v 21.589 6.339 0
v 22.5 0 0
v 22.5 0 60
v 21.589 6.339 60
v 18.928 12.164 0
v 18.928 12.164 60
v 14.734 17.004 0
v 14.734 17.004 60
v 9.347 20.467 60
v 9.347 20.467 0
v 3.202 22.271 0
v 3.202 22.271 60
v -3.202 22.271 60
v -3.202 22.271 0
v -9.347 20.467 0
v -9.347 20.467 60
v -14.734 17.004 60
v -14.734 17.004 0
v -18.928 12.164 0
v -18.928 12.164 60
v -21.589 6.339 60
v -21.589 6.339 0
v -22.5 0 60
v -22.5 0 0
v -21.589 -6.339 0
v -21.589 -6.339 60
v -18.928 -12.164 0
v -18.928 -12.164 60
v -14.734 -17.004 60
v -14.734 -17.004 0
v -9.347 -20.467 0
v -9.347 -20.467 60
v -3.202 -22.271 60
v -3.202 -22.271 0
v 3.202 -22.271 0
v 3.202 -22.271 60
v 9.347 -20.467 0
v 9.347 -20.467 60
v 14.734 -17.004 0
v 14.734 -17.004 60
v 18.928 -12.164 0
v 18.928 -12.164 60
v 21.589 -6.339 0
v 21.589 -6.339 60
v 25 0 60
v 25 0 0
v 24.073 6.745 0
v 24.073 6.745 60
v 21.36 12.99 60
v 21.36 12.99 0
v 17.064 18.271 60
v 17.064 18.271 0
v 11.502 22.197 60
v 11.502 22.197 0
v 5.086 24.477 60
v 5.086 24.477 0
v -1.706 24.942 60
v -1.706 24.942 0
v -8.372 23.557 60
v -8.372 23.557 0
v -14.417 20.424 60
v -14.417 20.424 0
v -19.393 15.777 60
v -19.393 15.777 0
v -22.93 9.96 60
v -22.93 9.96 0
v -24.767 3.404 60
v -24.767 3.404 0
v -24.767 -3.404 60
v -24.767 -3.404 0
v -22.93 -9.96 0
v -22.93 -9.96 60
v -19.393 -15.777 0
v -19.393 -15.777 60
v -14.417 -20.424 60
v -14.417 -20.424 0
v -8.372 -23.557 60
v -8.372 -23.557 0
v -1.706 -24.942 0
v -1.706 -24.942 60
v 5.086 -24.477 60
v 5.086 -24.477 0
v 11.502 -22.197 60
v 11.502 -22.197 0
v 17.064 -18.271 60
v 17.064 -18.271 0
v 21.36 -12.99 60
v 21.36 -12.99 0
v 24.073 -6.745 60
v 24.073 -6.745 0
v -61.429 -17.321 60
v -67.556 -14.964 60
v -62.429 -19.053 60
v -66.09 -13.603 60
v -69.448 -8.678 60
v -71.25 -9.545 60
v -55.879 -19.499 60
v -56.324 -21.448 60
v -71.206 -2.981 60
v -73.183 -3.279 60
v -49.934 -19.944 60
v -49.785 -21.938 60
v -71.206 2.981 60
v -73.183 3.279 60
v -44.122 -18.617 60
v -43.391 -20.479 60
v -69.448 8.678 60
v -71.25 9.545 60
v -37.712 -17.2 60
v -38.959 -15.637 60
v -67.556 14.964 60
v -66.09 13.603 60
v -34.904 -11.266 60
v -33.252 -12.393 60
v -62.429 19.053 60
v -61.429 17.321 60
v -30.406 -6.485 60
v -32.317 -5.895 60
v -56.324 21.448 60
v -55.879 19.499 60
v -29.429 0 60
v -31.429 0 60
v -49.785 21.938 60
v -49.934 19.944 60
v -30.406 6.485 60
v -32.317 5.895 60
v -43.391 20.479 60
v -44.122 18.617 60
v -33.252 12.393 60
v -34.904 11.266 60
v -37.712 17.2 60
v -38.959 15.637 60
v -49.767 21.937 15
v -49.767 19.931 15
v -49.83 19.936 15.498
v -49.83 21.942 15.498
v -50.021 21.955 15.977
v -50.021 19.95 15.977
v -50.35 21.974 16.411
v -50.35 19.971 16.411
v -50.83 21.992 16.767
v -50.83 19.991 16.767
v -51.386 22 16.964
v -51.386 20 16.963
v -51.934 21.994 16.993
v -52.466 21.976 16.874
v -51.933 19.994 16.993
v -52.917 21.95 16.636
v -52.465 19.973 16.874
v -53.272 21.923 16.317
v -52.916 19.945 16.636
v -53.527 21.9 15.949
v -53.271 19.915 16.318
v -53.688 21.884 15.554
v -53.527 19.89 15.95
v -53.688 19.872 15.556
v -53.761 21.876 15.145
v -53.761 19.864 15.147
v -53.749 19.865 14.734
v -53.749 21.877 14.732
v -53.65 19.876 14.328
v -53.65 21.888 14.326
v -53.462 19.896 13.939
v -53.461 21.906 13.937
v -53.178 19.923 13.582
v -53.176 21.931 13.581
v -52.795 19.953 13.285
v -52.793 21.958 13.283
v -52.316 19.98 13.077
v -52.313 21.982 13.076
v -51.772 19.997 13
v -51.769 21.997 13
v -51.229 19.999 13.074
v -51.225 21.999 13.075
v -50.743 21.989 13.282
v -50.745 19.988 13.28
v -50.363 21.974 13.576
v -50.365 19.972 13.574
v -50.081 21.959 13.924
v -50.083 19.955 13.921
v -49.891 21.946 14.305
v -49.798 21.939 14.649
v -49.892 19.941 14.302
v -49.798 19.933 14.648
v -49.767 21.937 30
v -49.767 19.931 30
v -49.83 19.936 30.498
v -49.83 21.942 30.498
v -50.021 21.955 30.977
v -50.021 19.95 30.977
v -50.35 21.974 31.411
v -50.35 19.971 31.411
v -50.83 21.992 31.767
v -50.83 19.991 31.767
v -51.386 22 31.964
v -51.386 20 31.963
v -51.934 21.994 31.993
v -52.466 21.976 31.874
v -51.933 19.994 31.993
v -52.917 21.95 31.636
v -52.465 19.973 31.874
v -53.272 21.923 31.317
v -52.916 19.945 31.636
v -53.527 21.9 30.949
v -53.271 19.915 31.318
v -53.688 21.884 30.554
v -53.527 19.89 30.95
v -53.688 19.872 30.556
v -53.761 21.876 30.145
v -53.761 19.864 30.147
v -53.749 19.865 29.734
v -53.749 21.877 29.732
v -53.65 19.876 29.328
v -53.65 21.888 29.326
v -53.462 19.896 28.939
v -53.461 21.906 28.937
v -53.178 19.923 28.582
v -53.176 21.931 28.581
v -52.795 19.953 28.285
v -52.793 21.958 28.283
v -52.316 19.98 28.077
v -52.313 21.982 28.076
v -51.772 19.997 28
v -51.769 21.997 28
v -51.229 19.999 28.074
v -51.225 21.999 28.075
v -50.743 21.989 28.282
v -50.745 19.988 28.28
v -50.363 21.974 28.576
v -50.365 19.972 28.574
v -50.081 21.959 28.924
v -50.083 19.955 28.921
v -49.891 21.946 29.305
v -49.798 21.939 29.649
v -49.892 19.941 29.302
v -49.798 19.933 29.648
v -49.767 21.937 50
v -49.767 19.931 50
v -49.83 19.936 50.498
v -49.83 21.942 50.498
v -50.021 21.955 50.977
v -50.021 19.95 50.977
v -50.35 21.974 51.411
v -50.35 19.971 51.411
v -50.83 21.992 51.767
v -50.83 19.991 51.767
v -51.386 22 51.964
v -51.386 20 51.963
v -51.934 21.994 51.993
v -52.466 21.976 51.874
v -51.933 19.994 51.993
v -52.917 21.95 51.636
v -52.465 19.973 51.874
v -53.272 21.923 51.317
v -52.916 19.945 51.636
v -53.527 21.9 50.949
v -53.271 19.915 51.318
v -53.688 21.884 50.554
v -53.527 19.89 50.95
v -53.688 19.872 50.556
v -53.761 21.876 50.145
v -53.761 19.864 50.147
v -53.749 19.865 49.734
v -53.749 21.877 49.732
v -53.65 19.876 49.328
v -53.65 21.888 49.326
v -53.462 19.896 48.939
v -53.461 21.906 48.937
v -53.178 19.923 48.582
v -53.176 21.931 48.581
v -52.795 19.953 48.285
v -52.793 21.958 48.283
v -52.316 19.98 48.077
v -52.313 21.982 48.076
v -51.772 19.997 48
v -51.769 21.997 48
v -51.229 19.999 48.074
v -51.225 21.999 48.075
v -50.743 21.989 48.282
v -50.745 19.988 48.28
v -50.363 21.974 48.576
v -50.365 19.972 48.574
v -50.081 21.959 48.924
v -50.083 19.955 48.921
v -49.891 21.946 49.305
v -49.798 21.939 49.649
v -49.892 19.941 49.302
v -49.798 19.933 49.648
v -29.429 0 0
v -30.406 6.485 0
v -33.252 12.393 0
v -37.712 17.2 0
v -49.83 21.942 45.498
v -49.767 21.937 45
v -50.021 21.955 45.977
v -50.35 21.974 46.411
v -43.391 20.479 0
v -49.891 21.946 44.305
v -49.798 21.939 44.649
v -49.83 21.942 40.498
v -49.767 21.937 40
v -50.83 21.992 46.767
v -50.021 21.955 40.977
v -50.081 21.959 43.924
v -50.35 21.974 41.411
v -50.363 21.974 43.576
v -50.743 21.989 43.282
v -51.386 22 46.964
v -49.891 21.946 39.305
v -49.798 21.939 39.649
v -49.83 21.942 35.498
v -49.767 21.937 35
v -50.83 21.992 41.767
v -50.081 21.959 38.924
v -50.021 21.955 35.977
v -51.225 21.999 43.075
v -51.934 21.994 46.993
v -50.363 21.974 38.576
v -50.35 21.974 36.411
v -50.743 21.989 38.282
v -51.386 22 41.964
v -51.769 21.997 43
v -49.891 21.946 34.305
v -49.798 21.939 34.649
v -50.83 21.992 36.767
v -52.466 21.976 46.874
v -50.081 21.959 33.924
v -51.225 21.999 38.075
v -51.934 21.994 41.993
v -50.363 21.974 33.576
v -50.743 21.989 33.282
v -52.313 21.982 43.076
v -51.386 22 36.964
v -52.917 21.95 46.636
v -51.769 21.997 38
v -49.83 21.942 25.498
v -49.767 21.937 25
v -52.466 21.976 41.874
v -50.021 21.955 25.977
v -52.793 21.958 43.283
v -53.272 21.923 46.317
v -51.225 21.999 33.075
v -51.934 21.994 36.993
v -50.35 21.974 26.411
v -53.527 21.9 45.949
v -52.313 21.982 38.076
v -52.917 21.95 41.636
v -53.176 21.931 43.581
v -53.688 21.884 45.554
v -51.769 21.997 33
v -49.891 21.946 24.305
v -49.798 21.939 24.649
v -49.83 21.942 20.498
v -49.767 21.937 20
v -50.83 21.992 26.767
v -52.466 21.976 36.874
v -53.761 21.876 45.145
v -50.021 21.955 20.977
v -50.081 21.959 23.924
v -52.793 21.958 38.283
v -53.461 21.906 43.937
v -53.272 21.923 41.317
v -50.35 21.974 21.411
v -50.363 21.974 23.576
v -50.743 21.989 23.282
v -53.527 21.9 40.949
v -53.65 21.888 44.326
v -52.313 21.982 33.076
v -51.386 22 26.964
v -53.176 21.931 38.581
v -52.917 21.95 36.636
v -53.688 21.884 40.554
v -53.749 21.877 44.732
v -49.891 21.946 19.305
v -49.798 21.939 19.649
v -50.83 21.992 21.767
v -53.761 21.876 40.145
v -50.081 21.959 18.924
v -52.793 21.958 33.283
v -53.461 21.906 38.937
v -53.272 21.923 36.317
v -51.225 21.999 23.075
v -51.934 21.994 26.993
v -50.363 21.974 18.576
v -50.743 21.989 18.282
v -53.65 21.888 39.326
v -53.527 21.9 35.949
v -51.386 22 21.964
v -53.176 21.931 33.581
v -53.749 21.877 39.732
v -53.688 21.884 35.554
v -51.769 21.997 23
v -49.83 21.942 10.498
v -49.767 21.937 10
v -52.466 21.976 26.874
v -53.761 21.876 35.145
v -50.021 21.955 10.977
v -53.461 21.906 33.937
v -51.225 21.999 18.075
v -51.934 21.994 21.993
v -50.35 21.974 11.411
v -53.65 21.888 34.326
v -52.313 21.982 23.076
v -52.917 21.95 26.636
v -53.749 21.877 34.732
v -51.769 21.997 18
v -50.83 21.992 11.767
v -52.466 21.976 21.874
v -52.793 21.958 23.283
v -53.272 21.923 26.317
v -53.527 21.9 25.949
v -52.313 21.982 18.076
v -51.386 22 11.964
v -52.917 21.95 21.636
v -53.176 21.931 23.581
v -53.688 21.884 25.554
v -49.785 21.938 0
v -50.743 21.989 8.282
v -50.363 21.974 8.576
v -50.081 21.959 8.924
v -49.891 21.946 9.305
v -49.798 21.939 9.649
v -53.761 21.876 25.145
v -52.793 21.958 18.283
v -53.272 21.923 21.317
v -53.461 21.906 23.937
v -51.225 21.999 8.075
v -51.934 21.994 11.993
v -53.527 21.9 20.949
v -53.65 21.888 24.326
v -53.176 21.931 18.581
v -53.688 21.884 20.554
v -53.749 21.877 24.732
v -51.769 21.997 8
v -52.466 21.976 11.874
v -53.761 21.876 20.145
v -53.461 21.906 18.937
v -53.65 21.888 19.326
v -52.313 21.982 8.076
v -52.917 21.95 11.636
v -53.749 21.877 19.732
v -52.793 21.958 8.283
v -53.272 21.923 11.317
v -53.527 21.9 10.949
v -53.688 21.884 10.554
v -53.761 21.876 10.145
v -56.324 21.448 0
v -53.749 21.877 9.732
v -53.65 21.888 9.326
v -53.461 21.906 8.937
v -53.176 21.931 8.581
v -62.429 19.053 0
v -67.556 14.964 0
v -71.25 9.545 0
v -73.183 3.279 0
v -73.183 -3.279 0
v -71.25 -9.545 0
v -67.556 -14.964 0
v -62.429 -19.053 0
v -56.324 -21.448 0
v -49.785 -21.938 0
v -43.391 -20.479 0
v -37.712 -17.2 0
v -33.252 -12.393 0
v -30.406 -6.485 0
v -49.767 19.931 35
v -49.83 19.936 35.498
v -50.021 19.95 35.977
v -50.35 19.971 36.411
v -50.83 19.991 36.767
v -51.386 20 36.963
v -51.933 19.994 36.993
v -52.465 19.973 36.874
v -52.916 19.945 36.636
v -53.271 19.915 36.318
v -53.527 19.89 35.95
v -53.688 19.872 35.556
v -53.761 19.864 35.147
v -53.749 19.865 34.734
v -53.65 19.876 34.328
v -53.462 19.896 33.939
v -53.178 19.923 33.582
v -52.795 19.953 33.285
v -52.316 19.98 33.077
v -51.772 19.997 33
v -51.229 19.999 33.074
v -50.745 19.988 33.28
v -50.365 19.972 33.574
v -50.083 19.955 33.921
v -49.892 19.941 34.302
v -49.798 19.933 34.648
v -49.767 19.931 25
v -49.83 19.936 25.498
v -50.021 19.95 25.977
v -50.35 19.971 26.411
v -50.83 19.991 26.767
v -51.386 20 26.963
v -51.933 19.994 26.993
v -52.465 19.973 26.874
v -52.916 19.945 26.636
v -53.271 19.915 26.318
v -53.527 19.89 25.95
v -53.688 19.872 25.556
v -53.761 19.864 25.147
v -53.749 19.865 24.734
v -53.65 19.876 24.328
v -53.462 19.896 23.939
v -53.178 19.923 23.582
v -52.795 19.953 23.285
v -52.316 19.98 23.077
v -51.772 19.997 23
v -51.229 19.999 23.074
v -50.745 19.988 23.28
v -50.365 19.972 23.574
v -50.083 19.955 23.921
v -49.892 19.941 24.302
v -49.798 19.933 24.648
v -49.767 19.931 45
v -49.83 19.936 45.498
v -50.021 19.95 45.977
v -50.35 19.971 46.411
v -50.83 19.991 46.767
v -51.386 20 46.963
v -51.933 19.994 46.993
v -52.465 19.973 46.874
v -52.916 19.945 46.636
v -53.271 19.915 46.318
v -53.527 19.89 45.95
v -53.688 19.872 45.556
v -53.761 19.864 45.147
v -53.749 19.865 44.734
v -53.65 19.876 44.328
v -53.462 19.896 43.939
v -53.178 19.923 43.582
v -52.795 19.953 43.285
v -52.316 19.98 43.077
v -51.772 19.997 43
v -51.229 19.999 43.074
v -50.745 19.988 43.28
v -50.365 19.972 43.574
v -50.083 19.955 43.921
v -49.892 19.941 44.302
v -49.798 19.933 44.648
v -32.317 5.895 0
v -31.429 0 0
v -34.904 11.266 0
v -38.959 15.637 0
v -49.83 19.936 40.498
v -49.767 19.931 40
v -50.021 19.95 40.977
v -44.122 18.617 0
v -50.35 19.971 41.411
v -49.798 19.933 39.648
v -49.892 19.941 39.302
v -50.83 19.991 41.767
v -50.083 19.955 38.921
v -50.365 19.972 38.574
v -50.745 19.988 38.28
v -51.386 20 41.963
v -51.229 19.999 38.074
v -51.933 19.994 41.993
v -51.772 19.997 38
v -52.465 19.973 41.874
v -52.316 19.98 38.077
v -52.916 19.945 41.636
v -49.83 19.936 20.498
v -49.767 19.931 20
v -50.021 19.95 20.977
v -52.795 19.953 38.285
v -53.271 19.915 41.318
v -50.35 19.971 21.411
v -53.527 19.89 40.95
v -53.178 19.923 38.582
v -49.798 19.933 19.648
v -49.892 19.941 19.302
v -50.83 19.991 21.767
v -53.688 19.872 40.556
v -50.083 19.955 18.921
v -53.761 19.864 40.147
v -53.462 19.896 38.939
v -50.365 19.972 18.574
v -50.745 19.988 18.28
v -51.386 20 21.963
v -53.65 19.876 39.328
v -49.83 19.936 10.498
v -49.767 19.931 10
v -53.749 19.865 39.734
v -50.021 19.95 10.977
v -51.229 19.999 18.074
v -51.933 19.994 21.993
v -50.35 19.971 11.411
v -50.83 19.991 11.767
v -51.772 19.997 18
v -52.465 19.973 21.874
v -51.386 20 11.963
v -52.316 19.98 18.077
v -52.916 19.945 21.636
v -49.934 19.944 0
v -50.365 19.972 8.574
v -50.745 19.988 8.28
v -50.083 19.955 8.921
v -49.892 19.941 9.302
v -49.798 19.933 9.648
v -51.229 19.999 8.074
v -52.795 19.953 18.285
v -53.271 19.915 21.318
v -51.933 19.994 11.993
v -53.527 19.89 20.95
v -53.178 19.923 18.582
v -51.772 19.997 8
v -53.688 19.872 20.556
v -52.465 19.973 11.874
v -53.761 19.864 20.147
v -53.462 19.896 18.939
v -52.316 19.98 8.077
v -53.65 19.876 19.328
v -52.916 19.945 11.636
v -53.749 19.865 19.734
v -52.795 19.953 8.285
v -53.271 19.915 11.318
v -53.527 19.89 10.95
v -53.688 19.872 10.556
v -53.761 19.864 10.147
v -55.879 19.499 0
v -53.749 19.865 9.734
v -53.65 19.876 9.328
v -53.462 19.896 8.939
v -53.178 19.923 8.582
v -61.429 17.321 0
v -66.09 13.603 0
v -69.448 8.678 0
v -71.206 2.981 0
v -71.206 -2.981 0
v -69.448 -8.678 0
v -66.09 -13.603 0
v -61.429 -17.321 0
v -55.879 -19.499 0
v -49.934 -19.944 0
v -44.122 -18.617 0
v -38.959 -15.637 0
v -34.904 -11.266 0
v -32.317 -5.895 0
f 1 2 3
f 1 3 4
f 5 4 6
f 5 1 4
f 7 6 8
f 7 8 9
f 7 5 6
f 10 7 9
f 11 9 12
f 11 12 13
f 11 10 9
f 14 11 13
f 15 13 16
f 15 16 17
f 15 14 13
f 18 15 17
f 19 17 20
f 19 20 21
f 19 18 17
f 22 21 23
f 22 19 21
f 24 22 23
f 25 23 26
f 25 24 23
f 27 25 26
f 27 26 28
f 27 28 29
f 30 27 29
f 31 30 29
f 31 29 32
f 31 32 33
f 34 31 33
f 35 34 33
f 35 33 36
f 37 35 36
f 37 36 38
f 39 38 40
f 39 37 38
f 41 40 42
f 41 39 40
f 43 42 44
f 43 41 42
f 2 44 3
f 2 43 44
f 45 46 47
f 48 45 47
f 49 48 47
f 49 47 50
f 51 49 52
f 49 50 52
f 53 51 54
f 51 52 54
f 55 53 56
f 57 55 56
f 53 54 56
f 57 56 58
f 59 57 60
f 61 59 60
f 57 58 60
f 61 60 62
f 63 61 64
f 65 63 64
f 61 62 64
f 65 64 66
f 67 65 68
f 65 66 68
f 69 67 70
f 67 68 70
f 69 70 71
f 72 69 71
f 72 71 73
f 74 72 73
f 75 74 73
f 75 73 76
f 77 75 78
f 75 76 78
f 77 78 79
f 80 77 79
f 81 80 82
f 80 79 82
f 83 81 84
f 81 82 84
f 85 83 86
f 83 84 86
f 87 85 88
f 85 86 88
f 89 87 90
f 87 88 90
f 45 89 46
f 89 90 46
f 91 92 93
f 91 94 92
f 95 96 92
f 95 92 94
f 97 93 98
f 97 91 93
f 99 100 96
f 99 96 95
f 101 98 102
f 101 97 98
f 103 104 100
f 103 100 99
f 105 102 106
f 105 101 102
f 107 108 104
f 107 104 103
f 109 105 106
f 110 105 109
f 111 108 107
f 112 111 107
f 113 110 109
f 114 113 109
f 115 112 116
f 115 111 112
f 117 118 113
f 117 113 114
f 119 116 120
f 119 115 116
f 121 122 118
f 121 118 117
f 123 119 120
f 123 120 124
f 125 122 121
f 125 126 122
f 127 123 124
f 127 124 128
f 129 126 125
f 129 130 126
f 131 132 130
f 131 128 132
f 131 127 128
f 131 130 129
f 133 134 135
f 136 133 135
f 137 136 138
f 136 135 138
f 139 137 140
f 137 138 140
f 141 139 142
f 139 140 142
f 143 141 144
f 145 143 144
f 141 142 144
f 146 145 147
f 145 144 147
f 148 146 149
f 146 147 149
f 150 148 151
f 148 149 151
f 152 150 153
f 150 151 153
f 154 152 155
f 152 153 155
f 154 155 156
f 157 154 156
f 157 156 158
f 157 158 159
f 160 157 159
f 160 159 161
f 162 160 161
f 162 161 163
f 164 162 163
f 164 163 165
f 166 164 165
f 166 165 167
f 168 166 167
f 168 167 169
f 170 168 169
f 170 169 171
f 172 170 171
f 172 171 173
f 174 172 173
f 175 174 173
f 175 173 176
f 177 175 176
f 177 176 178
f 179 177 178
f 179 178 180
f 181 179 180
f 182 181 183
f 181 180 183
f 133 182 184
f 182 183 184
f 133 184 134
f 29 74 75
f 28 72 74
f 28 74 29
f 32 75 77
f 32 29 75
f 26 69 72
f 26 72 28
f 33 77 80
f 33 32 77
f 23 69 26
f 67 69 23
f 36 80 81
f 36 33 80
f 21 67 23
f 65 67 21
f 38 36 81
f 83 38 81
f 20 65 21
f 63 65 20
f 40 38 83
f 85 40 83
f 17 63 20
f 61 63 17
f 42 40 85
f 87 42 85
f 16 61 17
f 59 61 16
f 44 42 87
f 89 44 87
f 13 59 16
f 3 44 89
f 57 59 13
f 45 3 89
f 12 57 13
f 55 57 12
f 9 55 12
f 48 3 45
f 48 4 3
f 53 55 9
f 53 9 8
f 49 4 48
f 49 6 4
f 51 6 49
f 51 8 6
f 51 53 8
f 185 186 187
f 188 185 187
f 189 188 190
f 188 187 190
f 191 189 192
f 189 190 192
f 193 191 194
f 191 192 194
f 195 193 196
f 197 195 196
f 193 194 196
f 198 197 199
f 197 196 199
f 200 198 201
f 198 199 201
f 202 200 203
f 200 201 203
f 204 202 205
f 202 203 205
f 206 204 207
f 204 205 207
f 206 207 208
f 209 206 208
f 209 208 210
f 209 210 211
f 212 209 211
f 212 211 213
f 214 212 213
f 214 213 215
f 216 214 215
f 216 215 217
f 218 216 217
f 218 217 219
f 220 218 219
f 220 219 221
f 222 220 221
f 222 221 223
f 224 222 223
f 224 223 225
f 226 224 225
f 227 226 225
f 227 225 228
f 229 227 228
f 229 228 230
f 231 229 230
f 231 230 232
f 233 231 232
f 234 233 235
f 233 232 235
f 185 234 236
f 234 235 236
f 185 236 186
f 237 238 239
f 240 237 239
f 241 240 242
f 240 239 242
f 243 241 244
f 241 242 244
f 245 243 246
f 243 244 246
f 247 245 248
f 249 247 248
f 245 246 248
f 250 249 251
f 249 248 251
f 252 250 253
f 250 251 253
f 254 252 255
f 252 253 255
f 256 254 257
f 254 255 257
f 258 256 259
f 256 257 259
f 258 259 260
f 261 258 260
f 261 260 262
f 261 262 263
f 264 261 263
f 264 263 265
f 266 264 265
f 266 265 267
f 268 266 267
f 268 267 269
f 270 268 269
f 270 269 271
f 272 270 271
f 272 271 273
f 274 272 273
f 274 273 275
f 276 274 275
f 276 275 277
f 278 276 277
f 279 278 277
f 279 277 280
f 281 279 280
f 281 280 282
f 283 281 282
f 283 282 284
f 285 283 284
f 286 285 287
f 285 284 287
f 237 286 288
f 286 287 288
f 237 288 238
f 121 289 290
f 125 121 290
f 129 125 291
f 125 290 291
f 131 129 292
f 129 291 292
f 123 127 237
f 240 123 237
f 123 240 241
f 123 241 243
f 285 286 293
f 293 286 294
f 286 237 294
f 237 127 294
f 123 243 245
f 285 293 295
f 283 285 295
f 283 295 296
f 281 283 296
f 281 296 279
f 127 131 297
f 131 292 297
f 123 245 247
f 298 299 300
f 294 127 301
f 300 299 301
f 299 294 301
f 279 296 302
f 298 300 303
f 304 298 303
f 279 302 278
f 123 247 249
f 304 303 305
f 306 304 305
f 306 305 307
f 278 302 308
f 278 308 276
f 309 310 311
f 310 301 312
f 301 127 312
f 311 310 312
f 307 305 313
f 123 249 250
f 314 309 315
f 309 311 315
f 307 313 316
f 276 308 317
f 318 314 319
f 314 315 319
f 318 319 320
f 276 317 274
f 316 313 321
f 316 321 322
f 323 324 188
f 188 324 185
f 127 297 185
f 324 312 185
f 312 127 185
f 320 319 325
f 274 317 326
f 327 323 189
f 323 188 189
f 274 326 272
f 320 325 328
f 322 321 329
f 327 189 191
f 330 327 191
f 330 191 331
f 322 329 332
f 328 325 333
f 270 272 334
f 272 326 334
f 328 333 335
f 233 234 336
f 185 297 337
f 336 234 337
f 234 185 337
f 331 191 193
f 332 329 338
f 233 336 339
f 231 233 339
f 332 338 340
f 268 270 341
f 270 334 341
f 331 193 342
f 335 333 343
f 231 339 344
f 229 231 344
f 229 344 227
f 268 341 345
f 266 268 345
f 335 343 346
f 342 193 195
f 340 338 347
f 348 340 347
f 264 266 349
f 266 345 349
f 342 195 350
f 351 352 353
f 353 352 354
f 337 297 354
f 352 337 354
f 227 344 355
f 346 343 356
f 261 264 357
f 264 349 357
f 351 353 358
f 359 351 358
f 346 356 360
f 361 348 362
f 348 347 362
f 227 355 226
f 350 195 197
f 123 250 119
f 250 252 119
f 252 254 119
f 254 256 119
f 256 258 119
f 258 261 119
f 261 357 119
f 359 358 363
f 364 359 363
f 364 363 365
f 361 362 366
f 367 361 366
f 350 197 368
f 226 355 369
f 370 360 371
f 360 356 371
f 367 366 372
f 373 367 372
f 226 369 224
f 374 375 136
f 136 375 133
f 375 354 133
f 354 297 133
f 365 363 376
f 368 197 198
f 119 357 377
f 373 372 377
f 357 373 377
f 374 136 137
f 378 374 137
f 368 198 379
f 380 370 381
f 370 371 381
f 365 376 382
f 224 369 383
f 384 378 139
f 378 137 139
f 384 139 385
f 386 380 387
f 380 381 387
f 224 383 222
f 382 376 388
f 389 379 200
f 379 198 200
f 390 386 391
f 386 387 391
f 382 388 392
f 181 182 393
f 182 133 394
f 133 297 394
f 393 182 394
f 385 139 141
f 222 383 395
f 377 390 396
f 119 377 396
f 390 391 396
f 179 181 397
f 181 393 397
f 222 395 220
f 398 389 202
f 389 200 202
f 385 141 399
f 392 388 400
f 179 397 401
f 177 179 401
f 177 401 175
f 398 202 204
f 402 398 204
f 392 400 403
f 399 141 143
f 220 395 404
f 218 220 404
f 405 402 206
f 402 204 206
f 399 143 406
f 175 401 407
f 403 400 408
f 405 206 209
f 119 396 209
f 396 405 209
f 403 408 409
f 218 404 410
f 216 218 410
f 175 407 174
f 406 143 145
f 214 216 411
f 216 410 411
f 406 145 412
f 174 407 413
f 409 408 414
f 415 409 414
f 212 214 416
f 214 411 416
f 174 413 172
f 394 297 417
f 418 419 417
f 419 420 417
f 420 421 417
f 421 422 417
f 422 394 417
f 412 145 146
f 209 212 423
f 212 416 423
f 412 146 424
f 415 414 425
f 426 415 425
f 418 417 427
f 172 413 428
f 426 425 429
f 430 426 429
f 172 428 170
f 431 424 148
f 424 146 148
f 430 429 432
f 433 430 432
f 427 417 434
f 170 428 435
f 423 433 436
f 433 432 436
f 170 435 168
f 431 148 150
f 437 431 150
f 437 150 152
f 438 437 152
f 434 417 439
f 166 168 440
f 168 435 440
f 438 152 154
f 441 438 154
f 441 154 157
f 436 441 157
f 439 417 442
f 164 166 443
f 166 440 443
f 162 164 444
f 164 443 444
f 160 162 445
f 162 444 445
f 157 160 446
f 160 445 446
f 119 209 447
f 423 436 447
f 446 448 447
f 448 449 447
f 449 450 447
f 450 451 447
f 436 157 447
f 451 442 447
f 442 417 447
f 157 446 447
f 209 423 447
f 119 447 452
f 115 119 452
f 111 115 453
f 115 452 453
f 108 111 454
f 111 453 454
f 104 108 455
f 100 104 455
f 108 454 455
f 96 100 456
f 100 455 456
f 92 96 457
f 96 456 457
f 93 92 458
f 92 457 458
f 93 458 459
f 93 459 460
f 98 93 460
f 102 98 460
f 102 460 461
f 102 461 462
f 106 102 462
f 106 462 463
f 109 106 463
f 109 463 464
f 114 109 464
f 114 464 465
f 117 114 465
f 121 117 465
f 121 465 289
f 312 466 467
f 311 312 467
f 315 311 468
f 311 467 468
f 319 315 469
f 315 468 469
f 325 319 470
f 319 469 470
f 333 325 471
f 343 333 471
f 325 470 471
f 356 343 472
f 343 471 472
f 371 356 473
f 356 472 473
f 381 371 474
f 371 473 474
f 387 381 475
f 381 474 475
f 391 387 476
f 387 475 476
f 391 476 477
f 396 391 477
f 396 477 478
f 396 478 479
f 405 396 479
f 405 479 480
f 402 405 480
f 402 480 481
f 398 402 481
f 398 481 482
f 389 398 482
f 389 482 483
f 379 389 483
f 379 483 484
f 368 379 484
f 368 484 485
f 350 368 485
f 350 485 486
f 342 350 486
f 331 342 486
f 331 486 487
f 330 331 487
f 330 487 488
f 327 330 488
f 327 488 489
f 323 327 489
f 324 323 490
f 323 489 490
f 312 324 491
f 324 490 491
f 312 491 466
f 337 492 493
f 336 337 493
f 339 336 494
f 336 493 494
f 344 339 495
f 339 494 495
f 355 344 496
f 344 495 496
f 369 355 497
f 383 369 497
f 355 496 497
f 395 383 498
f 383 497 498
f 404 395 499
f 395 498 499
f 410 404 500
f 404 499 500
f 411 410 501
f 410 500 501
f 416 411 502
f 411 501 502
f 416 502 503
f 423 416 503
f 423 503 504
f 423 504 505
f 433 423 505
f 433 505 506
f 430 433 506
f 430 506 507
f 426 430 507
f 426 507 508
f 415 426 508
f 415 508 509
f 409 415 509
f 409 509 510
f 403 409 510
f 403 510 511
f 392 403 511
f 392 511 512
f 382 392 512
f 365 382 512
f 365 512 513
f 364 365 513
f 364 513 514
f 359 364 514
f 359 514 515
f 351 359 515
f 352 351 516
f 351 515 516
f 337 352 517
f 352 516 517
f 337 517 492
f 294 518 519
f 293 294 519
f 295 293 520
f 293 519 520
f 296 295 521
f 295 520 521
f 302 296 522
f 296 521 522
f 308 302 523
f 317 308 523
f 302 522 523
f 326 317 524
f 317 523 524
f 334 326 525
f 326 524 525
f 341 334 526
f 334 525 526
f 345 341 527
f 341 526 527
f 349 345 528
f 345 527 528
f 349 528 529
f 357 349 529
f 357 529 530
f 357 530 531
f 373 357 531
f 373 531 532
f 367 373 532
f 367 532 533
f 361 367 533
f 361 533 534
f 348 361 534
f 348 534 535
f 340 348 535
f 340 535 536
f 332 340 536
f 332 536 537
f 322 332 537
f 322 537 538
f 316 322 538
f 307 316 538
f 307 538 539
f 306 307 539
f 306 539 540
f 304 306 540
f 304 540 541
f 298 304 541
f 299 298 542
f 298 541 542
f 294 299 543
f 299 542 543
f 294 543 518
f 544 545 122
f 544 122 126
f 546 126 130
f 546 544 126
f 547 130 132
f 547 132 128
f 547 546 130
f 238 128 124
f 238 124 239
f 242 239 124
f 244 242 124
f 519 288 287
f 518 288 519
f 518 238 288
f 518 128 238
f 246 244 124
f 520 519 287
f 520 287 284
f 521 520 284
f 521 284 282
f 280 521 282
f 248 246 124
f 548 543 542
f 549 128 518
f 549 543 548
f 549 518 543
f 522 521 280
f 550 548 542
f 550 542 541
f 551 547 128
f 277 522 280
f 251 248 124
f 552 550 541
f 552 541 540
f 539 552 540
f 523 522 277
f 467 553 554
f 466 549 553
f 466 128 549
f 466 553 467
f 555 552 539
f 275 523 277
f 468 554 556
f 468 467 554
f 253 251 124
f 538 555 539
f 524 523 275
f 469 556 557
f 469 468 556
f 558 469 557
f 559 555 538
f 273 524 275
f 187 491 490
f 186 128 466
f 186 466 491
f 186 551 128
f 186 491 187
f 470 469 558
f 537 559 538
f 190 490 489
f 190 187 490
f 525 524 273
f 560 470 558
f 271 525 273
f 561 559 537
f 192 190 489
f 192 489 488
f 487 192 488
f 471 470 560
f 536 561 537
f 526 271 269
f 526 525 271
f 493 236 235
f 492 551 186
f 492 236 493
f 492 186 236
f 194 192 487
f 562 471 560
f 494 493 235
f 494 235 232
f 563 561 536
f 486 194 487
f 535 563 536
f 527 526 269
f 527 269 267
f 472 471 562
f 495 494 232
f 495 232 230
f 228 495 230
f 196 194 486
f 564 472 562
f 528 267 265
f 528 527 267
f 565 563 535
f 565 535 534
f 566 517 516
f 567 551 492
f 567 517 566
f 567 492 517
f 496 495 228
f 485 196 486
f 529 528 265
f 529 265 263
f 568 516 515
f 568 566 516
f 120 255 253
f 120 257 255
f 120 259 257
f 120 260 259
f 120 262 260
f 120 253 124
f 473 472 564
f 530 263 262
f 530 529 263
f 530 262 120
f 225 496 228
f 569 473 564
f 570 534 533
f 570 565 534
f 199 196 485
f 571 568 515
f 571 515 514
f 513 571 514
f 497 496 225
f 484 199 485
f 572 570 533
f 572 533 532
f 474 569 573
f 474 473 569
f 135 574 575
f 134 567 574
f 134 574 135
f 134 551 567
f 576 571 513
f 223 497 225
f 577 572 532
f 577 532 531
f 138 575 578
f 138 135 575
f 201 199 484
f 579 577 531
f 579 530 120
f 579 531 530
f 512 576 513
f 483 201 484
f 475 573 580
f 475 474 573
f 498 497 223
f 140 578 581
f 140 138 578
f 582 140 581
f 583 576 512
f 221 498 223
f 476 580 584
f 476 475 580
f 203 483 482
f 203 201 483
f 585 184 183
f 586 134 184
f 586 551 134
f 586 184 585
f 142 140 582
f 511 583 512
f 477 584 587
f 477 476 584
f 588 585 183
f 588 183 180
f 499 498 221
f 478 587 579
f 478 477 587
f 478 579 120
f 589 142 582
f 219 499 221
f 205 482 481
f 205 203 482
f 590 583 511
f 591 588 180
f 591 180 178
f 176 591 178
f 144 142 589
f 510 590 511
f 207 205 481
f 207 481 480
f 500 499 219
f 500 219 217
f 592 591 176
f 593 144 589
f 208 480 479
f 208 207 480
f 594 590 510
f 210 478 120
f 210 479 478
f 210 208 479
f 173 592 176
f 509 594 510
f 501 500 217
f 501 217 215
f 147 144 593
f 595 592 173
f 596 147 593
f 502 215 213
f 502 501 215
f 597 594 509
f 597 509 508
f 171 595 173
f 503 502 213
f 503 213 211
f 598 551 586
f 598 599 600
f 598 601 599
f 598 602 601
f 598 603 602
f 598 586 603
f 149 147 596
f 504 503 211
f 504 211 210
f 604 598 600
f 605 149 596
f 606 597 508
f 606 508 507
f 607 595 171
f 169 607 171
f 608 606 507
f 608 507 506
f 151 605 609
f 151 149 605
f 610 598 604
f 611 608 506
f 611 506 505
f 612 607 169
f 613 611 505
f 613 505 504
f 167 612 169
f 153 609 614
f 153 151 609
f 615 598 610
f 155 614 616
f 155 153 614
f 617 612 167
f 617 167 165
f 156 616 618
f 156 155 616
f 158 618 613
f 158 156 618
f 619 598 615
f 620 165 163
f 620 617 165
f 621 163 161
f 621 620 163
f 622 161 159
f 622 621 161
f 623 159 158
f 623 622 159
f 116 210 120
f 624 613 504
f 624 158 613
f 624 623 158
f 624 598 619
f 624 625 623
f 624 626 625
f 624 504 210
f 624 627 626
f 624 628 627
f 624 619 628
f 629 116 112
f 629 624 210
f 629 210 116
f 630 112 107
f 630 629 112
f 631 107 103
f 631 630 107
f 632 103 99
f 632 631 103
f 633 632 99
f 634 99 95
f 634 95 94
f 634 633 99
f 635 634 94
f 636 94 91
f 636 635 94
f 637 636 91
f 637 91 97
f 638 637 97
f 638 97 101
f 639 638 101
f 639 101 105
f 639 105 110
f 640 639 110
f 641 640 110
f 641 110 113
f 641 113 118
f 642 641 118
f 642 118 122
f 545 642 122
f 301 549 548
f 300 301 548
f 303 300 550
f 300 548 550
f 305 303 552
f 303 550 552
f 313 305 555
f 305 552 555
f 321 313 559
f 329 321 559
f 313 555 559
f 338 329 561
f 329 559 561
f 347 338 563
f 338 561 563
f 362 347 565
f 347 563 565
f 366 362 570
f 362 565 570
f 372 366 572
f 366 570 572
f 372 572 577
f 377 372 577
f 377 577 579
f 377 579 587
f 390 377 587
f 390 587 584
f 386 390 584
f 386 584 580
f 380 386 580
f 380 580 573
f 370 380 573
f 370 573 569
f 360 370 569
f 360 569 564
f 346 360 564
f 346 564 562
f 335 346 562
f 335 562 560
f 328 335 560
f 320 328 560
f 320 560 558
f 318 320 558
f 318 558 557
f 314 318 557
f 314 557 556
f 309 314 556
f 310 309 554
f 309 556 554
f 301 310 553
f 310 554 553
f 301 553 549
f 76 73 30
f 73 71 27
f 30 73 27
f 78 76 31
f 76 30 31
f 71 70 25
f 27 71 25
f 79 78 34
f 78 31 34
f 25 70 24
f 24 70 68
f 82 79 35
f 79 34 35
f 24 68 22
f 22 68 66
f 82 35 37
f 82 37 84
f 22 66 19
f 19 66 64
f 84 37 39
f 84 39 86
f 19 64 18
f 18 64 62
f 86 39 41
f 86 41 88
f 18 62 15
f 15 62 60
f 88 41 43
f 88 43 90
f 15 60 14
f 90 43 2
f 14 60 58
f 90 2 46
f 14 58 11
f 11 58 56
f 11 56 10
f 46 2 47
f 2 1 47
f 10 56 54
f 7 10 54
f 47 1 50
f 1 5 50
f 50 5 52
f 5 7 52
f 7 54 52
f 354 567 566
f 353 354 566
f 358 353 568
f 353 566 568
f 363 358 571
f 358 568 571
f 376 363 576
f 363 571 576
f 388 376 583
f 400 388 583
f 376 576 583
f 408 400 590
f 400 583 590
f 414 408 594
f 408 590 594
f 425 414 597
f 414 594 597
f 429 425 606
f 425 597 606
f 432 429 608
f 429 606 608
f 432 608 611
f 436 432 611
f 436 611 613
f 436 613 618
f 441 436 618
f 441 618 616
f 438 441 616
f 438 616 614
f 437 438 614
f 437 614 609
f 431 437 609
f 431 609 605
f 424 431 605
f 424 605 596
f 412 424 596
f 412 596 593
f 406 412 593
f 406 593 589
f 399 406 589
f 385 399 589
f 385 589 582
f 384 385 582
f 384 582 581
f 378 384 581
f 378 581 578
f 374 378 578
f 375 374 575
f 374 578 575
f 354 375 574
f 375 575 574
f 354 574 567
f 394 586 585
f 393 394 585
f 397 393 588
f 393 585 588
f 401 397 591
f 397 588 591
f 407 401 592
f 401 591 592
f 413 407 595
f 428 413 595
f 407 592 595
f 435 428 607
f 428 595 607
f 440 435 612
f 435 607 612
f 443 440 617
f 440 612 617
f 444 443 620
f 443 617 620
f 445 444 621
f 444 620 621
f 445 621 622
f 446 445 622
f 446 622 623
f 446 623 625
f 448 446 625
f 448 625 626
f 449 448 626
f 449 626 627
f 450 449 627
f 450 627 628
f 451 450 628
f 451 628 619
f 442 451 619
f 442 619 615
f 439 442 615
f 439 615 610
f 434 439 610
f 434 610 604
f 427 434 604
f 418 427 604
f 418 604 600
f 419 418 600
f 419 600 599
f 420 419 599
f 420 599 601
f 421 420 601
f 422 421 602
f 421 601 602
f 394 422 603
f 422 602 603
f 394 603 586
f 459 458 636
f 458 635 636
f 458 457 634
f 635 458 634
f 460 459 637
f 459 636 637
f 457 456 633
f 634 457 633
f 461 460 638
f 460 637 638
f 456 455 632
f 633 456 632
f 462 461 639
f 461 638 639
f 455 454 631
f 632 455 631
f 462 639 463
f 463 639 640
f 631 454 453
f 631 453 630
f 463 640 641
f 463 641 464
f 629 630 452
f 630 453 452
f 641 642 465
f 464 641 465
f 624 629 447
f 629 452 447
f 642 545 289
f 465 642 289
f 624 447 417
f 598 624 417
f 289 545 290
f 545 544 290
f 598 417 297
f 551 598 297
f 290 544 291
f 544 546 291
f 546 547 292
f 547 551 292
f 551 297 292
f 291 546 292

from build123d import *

# Parameters (mm, degrees)
F0_R     = 25
F0_R_2   = 22.5
F1_DEPTH = 60
F2_R     = 22
F2_R_2   = 20
F3_DEPTH = 60
F5_D     = 4
F5_DEPTH = 22.001


with BuildPart() as f1:
    # F0 (on Top) → F1 (new body)
    with BuildSketch(Plane.XY):
        Circle(F0_R)
        Circle(F0_R_2, mode=Mode.SUBTRACT)
    extrude(amount=F1_DEPTH)


with BuildPart() as f3:
    # F2 (on Top) → F3 (new body)
    with BuildSketch(Plane.XY):
        with Locations((-51.4289374806, 0)):
            Circle(F2_R)
        with Locations((-51.4289374806, 0)):
            Circle(F2_R_2, mode=Mode.SUBTRACT)
    extrude(amount=F3_DEPTH)

    # F5 (through all, one way)
    with BuildSketch(Plane.XZ):
        with Locations((-51.7666899301, 50), (-51.7666899301, 45), (-51.7666899301, 40), (-51.7666899301, 35), (-51.7666899301, 30), (-51.7666899301, 25), (-51.7666899301, 20), (-51.7666899301, 15), (-51.7666899301, 10)):
            Circle(F5_D / 2)
    extrude(amount=-F5_DEPTH, mode=Mode.SUBTRACT)


solid = Compound([f1.part, f3.part])
